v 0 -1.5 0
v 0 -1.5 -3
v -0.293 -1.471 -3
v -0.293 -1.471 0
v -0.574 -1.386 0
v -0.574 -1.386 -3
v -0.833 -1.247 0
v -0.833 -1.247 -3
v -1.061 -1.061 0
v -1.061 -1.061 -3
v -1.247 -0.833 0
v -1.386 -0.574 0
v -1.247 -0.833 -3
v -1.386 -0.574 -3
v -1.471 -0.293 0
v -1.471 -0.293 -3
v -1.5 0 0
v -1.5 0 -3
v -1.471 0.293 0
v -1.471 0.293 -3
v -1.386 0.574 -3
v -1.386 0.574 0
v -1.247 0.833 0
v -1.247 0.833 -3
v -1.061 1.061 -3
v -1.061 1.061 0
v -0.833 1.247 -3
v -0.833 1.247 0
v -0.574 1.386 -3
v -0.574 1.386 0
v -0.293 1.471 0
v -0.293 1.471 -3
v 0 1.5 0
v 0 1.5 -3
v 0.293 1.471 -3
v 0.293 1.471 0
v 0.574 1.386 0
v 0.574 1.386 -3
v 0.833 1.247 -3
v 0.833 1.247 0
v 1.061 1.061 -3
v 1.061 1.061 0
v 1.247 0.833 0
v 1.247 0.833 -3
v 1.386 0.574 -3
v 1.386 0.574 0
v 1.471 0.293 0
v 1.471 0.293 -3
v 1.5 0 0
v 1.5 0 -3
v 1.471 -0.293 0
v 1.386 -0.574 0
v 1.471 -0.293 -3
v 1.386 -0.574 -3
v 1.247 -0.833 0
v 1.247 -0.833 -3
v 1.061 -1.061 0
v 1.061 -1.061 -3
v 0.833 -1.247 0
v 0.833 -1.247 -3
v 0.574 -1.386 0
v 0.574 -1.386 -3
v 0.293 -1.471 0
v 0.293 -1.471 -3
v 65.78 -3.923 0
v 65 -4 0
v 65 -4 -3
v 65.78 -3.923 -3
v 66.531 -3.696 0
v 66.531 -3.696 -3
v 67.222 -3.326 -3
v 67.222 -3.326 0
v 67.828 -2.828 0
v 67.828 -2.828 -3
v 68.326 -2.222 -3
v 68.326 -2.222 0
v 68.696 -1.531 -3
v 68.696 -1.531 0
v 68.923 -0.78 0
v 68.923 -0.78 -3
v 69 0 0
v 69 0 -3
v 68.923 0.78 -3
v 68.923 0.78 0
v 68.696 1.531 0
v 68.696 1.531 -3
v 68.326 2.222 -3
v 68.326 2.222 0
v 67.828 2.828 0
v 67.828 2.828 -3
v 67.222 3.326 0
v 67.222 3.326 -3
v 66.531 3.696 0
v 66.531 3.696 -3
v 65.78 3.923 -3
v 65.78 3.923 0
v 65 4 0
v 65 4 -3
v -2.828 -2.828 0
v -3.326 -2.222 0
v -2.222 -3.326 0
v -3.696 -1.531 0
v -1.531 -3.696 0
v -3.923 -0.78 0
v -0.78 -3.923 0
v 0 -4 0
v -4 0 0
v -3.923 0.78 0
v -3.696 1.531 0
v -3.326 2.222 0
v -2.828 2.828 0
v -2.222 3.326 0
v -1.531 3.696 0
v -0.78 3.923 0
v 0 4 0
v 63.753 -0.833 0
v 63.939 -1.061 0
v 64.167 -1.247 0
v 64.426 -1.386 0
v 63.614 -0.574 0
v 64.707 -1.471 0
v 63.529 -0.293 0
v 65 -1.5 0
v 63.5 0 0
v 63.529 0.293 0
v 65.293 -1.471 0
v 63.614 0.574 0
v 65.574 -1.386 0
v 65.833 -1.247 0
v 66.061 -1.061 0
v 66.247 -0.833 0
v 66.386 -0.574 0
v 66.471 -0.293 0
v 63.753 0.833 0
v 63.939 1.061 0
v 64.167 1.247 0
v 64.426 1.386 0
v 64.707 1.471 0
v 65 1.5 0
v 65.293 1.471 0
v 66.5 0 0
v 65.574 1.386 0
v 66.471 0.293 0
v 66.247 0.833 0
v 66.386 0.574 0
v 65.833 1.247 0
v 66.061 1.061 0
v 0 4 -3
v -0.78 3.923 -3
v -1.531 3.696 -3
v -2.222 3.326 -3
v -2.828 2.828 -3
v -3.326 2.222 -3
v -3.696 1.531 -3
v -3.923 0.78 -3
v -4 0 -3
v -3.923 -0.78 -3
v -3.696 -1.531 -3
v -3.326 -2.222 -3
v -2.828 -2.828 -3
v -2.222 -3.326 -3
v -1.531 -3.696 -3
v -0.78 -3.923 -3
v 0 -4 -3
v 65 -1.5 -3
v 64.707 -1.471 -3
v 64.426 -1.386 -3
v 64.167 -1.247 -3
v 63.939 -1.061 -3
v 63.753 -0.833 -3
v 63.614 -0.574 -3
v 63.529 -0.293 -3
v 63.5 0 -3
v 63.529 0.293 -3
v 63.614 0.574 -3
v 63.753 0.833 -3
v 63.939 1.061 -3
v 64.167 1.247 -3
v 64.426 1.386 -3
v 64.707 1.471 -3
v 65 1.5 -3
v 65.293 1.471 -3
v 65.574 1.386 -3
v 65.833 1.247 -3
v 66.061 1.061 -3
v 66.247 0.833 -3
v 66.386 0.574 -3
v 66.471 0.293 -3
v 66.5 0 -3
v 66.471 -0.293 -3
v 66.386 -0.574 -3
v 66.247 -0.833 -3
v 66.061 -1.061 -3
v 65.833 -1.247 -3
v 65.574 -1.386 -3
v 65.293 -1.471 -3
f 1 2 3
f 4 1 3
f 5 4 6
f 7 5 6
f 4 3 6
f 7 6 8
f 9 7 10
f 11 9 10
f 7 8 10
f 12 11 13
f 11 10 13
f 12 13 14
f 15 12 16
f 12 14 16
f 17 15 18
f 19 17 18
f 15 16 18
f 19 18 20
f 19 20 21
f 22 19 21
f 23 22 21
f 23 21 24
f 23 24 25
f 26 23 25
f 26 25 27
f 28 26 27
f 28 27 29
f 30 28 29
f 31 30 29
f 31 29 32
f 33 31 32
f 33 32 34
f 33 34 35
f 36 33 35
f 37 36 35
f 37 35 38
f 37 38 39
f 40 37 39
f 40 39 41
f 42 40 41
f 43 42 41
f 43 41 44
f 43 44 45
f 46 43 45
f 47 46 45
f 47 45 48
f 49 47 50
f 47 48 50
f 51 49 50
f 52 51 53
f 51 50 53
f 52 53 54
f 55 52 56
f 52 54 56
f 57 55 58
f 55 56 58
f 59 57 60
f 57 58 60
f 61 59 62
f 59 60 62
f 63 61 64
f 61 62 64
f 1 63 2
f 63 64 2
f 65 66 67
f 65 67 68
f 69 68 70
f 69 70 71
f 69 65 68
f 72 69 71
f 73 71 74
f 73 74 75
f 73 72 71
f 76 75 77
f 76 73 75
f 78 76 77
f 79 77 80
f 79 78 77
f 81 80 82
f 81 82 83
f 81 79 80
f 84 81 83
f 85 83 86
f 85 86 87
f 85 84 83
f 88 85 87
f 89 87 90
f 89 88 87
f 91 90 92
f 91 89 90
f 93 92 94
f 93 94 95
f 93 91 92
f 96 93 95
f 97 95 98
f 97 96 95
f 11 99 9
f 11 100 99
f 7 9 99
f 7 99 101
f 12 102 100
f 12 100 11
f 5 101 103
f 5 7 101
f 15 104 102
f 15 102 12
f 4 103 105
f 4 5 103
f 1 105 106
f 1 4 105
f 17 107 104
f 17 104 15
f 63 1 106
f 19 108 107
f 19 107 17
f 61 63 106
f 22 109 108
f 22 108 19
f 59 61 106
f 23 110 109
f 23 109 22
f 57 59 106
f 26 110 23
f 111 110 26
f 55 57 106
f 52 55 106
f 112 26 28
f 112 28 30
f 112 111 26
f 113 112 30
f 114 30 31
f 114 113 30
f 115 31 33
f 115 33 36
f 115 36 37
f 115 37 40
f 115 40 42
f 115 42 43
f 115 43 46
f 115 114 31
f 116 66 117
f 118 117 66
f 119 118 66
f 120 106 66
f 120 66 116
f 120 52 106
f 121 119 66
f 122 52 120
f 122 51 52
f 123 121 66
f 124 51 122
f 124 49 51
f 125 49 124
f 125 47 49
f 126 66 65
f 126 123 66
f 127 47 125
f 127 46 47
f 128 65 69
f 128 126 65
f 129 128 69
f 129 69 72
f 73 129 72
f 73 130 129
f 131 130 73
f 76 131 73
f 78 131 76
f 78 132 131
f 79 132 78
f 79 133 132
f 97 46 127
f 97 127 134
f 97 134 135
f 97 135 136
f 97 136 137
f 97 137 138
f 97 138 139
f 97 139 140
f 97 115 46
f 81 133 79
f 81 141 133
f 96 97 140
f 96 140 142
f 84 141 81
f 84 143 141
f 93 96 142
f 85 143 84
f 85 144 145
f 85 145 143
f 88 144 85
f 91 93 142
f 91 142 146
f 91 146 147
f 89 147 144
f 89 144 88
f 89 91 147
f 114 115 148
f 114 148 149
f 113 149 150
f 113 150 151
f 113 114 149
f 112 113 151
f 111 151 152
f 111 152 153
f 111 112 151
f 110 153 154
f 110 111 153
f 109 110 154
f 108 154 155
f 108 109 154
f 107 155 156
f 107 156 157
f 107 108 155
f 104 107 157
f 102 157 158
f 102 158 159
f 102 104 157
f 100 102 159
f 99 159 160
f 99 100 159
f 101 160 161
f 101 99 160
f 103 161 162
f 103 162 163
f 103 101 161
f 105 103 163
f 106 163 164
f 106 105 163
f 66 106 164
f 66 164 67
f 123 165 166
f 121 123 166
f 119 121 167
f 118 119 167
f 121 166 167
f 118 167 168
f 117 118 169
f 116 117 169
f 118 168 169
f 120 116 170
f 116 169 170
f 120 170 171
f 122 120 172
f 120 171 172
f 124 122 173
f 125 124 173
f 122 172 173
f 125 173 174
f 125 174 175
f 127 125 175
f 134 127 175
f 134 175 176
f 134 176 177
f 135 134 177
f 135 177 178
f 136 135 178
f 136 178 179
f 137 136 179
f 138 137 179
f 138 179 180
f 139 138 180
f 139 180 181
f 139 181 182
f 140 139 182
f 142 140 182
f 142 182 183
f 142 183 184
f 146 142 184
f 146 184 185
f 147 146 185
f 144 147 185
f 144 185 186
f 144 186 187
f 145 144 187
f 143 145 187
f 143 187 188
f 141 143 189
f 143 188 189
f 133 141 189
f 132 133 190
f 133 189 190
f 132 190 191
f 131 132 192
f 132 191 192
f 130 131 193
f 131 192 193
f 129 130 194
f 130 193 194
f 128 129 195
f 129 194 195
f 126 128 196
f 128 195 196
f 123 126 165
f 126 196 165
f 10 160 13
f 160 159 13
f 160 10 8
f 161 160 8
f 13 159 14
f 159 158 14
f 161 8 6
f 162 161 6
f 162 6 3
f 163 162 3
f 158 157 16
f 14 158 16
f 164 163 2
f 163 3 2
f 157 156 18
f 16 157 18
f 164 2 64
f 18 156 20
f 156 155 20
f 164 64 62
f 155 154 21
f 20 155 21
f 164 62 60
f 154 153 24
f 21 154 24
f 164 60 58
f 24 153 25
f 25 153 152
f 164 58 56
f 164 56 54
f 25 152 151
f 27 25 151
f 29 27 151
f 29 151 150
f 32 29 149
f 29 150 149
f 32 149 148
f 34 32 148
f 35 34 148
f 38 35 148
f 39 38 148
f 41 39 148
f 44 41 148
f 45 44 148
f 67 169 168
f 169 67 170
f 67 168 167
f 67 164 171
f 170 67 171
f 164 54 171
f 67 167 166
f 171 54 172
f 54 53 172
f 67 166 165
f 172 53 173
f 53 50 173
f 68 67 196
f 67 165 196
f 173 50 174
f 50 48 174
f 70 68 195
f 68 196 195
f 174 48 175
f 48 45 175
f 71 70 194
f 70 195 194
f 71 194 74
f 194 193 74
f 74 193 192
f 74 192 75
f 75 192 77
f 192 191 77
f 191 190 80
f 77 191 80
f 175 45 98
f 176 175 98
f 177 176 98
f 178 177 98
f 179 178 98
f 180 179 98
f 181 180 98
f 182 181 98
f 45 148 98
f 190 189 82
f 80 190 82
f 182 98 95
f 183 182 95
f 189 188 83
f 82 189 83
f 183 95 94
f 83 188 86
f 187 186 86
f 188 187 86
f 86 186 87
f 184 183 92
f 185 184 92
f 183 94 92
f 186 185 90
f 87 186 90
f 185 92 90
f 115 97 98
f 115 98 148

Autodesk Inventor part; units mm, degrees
ref_plane "YZ Plane" through (0, 0, 0) normal (1, 0, 0) x (0, 1, 0)
ref_plane "XZ Plane" through (0, 0, 0) normal (0, 1, 0) x (-1, 0, 0)
ref_plane "XY Plane" through (0, 0, 0) normal (0, 0, 1) x (1, 0, 0)
sketch "Sketch1" plane through (0, 0, 0) normal (0, 0, 1) x (1, 0, 0)
  line L0 (0, 0) -> (65, 0) construction
  line L1 (0, -4) -> (65, -4)
  line L2 (65, 4) -> (0, 4)
  arc A0 (0, 4) -> (0, -4) centre (0, 0) ccw
  arc A1 (65, -4) -> (65, 4) centre (65, 0) ccw
  point P0 (32.5, 0)
  dimension "d0" = 65
  dimension "d1" = 4
extrude "Extrusion1" add sketch "Sketch1" against normal blind 3
hole "Hole1" at (0, 0, 0) at (65, 0, 0) direction (0, 0, -1) diameter 3 depth 8 tip angle 118
properties part number "LegBaseLink"
